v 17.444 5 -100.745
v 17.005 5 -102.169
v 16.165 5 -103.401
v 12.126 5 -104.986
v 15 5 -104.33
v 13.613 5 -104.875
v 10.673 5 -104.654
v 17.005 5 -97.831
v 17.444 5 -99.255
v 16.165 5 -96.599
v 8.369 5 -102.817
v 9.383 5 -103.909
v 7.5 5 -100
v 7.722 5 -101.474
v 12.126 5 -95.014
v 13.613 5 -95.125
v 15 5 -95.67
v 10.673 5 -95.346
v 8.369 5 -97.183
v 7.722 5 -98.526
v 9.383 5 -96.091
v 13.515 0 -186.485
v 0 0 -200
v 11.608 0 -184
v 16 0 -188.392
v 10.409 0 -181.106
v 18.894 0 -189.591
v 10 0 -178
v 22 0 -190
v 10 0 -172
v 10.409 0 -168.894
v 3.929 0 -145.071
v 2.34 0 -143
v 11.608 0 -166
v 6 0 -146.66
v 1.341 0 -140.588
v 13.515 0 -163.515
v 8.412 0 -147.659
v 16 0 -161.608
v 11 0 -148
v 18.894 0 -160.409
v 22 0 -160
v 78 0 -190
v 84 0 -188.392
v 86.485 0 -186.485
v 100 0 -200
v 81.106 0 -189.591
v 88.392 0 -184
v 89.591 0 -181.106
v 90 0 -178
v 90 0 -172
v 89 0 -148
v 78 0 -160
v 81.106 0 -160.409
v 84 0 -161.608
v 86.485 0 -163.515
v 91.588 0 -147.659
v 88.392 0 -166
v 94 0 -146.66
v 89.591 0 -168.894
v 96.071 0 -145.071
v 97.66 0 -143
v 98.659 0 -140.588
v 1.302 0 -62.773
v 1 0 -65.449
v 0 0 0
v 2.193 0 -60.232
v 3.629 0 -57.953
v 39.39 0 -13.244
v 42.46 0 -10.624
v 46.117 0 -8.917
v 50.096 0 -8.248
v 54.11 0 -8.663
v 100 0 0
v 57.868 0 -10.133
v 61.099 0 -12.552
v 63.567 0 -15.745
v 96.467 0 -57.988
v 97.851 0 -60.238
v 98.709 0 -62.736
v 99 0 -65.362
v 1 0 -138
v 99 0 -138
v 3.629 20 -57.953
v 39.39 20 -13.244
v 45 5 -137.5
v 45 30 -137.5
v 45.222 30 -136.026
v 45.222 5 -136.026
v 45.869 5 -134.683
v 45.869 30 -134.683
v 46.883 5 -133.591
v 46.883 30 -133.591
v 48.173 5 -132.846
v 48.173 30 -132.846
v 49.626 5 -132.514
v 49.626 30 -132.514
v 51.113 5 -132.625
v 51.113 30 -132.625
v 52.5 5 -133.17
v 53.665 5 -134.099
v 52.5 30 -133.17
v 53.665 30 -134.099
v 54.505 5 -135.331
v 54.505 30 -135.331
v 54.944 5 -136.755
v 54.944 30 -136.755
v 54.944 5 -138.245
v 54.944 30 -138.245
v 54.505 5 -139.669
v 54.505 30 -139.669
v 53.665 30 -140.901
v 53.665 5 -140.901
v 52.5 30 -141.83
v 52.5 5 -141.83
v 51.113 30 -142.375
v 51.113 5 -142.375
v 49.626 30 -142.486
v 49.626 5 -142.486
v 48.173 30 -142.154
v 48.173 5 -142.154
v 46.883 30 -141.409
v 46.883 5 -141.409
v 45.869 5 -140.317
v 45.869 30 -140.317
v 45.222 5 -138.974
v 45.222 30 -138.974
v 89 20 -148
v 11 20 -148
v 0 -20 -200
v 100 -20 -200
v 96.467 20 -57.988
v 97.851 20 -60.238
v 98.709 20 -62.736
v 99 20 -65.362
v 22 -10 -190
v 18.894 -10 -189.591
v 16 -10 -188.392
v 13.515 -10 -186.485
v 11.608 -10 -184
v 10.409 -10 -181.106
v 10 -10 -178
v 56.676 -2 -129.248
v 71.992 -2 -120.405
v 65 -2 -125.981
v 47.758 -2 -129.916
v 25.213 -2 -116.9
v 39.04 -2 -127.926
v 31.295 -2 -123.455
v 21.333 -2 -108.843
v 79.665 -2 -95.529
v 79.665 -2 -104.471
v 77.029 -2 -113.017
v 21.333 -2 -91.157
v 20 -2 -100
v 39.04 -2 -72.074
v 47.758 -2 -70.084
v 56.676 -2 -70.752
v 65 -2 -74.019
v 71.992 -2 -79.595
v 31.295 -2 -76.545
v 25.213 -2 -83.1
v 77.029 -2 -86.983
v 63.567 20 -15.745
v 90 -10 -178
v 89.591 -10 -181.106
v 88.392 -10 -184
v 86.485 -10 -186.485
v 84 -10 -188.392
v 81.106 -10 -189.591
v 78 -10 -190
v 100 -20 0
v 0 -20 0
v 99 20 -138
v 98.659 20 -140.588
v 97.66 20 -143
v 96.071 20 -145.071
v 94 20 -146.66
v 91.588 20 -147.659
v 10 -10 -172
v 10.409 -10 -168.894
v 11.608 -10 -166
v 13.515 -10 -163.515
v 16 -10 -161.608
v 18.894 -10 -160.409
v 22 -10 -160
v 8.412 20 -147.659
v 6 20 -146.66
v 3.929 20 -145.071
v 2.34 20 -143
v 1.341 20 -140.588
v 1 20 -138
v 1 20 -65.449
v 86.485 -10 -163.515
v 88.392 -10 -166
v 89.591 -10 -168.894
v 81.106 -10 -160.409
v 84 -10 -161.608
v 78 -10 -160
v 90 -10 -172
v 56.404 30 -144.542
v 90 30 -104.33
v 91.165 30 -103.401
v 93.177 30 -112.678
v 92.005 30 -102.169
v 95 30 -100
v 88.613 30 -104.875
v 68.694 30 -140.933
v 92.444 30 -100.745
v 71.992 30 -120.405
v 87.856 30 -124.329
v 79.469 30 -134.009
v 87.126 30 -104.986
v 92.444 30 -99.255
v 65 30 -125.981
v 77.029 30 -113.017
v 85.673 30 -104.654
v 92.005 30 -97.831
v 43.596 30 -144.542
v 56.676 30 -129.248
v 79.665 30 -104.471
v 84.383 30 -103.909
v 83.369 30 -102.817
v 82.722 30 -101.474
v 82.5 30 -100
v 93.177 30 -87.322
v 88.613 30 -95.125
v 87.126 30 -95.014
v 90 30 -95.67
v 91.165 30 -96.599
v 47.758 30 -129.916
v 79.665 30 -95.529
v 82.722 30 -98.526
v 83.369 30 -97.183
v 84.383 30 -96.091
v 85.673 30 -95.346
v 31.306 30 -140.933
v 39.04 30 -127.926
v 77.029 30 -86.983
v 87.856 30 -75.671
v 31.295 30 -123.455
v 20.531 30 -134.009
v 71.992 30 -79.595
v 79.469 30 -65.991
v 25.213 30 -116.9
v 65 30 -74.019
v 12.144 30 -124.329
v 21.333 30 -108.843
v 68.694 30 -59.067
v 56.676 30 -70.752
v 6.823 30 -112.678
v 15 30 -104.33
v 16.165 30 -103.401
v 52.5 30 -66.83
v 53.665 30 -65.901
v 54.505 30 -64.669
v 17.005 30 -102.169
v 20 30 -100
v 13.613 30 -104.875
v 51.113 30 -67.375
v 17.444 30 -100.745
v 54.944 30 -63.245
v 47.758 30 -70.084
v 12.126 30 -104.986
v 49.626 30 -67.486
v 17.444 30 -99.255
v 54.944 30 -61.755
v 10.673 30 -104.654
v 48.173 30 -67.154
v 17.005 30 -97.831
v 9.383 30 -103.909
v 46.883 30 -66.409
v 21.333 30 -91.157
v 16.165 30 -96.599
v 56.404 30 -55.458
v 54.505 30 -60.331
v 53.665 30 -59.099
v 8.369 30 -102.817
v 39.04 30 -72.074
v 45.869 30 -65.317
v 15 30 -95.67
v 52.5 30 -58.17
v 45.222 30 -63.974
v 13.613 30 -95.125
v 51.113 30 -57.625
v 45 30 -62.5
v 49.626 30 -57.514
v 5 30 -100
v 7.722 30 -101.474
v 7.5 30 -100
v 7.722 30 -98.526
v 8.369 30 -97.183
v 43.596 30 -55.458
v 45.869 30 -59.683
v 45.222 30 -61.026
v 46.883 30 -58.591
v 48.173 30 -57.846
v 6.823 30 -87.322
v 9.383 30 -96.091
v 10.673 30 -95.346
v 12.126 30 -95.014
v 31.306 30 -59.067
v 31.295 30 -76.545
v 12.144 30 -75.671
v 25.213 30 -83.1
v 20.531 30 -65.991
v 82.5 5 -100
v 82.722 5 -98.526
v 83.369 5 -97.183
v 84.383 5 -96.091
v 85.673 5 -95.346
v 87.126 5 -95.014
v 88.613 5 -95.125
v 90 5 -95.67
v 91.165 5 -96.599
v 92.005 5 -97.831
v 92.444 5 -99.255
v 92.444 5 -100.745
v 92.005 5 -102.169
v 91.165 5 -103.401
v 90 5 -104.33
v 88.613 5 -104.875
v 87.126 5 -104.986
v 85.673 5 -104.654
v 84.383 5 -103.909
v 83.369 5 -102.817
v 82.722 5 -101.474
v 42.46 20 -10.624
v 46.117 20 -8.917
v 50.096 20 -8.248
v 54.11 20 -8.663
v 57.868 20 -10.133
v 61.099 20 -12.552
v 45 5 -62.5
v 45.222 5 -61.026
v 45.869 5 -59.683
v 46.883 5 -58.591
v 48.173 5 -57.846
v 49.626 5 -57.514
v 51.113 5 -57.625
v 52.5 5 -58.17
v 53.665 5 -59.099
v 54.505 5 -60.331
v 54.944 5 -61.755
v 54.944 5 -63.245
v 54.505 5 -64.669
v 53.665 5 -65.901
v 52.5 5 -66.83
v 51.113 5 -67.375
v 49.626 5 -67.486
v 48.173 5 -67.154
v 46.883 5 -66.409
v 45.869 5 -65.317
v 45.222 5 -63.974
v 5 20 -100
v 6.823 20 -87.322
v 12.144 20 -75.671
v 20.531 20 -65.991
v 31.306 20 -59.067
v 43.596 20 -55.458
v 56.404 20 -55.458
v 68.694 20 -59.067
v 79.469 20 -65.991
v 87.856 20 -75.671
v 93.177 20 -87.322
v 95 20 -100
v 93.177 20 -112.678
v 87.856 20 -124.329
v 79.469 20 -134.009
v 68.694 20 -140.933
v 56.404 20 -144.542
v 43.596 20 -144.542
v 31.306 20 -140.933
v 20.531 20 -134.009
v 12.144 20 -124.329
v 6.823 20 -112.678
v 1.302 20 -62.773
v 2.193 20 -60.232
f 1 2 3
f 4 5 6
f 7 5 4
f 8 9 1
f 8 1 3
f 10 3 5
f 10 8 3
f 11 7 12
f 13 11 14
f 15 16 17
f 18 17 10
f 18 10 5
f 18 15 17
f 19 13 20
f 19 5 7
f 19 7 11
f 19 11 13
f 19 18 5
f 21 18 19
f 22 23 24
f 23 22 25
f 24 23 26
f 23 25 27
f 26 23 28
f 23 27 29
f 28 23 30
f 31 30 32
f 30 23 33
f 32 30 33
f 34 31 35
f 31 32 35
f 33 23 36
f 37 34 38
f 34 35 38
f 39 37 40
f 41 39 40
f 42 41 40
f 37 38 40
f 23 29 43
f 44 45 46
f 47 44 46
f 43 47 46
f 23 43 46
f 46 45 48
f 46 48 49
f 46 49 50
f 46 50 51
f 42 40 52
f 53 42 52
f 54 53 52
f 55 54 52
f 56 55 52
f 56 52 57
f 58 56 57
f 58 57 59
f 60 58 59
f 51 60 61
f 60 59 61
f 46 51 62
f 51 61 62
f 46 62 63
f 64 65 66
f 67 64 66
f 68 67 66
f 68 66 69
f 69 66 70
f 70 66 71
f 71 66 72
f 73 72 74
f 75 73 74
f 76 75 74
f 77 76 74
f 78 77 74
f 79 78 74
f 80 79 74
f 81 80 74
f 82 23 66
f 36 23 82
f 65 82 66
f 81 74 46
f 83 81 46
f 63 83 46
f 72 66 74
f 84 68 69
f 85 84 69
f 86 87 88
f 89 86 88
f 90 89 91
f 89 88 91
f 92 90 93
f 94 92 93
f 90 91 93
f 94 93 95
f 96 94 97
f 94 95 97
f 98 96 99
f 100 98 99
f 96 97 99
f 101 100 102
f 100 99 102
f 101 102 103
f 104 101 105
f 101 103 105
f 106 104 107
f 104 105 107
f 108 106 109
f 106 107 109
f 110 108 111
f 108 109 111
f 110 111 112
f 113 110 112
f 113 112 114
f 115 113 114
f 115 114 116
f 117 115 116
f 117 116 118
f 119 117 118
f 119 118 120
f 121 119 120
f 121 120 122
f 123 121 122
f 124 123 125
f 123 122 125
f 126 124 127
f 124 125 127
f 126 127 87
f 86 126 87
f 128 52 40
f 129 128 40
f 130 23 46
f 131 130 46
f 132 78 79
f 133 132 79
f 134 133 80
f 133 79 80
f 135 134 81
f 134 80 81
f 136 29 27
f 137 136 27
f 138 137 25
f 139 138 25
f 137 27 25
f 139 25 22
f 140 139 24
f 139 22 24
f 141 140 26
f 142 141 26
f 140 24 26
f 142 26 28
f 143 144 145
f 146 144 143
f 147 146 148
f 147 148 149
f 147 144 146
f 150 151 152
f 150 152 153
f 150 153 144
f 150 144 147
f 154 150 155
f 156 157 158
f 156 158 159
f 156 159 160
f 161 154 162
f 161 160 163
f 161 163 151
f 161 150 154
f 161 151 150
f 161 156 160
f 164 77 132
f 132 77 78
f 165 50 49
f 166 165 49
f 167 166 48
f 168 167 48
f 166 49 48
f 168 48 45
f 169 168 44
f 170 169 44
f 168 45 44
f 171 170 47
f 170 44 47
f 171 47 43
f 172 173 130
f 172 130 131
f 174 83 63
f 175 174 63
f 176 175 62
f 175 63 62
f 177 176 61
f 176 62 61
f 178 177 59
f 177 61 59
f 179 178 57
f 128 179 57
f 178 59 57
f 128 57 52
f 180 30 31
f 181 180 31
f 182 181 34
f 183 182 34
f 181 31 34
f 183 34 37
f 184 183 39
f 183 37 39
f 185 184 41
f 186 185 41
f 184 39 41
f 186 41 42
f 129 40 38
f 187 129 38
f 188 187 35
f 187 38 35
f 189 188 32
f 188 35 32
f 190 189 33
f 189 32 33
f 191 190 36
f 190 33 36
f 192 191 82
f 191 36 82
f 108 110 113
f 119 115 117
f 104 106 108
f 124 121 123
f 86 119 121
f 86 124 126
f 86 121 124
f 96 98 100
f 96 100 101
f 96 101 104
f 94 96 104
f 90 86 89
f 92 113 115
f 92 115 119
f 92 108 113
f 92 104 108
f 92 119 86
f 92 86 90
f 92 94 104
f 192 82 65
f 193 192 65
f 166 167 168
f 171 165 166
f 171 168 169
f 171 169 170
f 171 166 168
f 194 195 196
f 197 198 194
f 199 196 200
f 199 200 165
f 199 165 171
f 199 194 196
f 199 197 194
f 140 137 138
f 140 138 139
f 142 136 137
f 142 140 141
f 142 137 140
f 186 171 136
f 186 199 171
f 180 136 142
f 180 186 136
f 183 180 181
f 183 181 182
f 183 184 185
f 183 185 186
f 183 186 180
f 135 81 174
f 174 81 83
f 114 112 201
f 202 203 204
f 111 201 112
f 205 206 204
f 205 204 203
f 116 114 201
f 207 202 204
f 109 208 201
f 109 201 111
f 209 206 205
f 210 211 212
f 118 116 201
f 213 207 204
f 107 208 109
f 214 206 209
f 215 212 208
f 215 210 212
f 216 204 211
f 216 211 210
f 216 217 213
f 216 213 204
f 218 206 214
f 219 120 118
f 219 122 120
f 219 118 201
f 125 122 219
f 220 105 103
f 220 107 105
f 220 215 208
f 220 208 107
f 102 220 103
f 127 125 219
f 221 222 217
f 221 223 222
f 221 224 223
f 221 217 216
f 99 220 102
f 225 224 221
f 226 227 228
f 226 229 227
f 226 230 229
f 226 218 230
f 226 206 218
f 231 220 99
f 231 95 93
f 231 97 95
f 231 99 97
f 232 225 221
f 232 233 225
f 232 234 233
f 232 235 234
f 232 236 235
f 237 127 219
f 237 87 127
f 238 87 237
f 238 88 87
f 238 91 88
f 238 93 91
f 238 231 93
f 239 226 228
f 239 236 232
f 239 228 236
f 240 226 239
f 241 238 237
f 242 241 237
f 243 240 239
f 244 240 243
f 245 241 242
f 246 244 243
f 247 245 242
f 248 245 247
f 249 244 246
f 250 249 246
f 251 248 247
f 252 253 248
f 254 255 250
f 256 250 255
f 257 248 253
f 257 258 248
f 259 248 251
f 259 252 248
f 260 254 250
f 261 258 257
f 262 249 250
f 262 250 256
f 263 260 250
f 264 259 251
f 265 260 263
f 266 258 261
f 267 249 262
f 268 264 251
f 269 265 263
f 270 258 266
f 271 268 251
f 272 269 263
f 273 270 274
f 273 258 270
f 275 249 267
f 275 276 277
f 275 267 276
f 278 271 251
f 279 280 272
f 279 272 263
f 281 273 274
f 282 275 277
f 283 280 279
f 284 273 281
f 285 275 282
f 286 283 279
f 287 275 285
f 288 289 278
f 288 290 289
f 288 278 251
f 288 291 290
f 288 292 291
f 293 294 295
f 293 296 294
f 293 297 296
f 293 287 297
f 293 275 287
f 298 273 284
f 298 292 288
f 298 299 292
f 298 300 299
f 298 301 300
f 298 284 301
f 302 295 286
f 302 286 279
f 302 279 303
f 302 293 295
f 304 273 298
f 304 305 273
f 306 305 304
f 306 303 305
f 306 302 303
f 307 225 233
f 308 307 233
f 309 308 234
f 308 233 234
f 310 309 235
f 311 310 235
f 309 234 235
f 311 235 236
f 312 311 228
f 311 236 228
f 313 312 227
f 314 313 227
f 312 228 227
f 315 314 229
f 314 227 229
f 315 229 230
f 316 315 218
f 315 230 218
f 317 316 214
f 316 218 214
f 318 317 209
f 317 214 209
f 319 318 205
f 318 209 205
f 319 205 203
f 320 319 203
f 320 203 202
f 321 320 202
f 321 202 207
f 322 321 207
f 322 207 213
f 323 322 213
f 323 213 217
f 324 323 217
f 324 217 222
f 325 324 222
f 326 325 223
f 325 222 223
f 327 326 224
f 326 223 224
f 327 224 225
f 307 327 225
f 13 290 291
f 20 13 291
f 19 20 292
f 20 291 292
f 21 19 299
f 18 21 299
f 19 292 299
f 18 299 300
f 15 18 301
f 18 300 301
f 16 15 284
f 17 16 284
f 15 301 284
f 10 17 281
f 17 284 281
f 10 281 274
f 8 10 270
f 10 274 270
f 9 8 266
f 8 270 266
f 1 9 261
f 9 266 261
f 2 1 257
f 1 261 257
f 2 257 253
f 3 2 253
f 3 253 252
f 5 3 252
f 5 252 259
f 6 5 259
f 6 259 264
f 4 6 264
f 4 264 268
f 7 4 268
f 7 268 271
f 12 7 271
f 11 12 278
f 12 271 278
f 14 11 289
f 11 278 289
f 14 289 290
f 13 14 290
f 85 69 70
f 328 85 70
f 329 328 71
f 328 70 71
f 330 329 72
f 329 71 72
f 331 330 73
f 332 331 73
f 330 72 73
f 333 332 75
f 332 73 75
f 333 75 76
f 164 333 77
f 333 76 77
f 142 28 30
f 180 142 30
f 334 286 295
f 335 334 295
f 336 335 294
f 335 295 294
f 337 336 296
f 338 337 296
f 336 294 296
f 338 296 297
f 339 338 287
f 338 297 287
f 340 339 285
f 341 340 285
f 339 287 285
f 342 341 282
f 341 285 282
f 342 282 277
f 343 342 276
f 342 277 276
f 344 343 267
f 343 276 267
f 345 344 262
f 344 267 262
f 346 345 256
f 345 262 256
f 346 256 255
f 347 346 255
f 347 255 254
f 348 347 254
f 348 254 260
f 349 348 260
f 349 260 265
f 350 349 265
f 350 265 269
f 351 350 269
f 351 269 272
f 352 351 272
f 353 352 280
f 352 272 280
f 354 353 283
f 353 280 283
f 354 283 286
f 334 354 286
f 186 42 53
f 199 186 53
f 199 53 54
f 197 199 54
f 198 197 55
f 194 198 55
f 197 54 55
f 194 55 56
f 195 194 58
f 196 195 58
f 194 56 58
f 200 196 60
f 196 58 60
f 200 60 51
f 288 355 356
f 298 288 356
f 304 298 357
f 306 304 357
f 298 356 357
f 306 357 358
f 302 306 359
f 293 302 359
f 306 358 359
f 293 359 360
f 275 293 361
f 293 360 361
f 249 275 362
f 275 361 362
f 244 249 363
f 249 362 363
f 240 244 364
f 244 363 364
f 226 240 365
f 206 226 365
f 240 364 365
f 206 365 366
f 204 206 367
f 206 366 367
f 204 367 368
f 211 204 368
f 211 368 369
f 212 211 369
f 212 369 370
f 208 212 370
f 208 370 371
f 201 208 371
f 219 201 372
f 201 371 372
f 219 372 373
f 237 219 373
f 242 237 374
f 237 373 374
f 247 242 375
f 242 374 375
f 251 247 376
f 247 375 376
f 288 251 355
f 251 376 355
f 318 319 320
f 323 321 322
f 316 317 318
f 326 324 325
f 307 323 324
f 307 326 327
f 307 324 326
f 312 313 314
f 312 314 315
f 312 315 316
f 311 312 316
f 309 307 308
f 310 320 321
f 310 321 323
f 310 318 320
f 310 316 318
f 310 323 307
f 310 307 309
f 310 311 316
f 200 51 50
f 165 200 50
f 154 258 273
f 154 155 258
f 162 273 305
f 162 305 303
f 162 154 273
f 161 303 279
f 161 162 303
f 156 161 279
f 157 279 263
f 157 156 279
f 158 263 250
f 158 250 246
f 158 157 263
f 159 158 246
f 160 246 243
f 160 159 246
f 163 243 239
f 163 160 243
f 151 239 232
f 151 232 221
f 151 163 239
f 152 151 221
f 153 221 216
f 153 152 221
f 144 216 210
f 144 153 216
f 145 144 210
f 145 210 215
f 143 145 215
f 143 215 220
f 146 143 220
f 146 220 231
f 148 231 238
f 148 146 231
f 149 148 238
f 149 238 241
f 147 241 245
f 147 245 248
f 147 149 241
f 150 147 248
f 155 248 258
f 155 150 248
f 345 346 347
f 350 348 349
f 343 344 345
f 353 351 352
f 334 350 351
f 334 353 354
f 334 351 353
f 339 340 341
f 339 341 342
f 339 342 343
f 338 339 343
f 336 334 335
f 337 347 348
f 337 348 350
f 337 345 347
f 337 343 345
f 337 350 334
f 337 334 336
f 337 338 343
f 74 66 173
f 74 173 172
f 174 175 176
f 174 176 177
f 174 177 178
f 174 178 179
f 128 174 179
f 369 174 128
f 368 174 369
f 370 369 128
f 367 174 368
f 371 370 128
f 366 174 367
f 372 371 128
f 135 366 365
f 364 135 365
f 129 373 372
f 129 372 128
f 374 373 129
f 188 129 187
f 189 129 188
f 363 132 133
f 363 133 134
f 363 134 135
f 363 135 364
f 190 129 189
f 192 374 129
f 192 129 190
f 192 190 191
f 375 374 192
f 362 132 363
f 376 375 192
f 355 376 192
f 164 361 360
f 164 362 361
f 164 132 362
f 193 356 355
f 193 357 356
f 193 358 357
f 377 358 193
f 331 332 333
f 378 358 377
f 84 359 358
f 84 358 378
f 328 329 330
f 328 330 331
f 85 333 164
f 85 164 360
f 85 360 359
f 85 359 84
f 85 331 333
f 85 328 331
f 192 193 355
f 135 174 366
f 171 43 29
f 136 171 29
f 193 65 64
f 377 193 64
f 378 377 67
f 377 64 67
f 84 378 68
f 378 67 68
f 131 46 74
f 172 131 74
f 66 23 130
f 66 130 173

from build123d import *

# Parameters (mm, degrees)
F0_W      = 100
F0_H      = 200
F1_DEPTH  = 20
F3_DEPTH  = 10
F5_DEPTH  = 20
F6_R      = 45
F6_R_2    = 30
F7_DEPTH  = 10
F8_R      = 30
F9_DEPTH  = 22
F10_R     = 5
F11_DEPTH = 25


with BuildPart() as f1:
    # F0 (on Front) → F1 (new body)
    with BuildSketch(Plane.XZ):
        with Locations((50, -100)):
            Rectangle(F0_W, F0_H)
    extrude(amount=F1_DEPTH)

    # F2 (on face) → F3 (cut)
    with BuildSketch(Plane(origin=(0, 0, 0), x_dir=(-1, 0, 0), z_dir=(0, 1, 0))):
        with BuildLine():
            ThreePointArc((-90, -178), (-86.485281, -186.485281), (-78, -190))
            Line((-78, -190), (-22, -190))
            ThreePointArc((-22, -190), (-13.514719, -186.485281), (-10, -178))
            Line((-10, -178), (-10, -172))
            ThreePointArc((-10, -172), (-13.514719, -163.514719), (-22, -160))
            Line((-22, -160), (-78, -160))
            ThreePointArc((-78, -160), (-86.485281, -163.514719), (-90, -172))
            Line((-90, -172), (-90, -178))
        make_face()
    extrude(amount=-F3_DEPTH, mode=Mode.SUBTRACT)

    # F4 (on face) → F5 (join)
    with BuildSketch(Plane(origin=(0, 0, 0), x_dir=(-1, 0, 0), z_dir=(0, 1, 0))):
        with BuildLine():
            Line((-89, -148), (-11, -148))
            ThreePointArc((-11, -148), (-3.928932, -145.071068), (-1, -138))
            Line((-1, -138), (-1, -65.448764))
            ThreePointArc((-1, -65.448764), (-1.676281, -61.477192), (-3.628897, -57.95327))
            Line((-3.628897, -57.95327), (-39.39, -13.243608))
            ThreePointArc((-39.39, -13.243608), (-52.117284, -8.319647), (-63.566855, -15.745039))
            Line((-63.566855, -15.745039), (-96.467366, -57.988184))
            ThreePointArc((-96.467366, -57.988184), (-98.349194, -61.463537), (-99, -65.361716))
            Line((-99, -65.361716), (-99, -138))
            ThreePointArc((-99, -138), (-96.071068, -145.071068), (-89, -148))
        make_face()
    extrude(amount=F5_DEPTH)

    # F6 (on face) → F7 (join)
    with BuildSketch(Plane(origin=(0, 20, 0), x_dir=(-1, 0, 0), z_dir=(0, 1, 0))):
        with Locations((-50, -100)):
            Circle(F6_R)
        with Locations((-50, -100)):
            Circle(F6_R_2, mode=Mode.SUBTRACT)
    extrude(amount=F7_DEPTH)

    # F8 (on face) → F9 (cut)
    with BuildSketch(Plane(origin=(0, 20, 0), x_dir=(-1, 0, 0), z_dir=(0, 1, 0))):
        with Locations((-50, -100)):
            Circle(F8_R)
    extrude(amount=-F9_DEPTH, mode=Mode.SUBTRACT)

    # F10 (on face) → F11 (cut)
    with BuildSketch(Plane(origin=(0, 30, 0), x_dir=(-1, 0, 0), z_dir=(0, 1, 0))):
        with Locations((-87.5, -100)):
            Circle(F10_R)
        with Locations((-12.5, -100)):
            Circle(F10_R)
        with Locations((-50, -137.5)):
            Circle(F10_R)
        with Locations((-50, -62.5)):
            Circle(F10_R)
    extrude(amount=-F11_DEPTH, mode=Mode.SUBTRACT)


solid = f1.part
